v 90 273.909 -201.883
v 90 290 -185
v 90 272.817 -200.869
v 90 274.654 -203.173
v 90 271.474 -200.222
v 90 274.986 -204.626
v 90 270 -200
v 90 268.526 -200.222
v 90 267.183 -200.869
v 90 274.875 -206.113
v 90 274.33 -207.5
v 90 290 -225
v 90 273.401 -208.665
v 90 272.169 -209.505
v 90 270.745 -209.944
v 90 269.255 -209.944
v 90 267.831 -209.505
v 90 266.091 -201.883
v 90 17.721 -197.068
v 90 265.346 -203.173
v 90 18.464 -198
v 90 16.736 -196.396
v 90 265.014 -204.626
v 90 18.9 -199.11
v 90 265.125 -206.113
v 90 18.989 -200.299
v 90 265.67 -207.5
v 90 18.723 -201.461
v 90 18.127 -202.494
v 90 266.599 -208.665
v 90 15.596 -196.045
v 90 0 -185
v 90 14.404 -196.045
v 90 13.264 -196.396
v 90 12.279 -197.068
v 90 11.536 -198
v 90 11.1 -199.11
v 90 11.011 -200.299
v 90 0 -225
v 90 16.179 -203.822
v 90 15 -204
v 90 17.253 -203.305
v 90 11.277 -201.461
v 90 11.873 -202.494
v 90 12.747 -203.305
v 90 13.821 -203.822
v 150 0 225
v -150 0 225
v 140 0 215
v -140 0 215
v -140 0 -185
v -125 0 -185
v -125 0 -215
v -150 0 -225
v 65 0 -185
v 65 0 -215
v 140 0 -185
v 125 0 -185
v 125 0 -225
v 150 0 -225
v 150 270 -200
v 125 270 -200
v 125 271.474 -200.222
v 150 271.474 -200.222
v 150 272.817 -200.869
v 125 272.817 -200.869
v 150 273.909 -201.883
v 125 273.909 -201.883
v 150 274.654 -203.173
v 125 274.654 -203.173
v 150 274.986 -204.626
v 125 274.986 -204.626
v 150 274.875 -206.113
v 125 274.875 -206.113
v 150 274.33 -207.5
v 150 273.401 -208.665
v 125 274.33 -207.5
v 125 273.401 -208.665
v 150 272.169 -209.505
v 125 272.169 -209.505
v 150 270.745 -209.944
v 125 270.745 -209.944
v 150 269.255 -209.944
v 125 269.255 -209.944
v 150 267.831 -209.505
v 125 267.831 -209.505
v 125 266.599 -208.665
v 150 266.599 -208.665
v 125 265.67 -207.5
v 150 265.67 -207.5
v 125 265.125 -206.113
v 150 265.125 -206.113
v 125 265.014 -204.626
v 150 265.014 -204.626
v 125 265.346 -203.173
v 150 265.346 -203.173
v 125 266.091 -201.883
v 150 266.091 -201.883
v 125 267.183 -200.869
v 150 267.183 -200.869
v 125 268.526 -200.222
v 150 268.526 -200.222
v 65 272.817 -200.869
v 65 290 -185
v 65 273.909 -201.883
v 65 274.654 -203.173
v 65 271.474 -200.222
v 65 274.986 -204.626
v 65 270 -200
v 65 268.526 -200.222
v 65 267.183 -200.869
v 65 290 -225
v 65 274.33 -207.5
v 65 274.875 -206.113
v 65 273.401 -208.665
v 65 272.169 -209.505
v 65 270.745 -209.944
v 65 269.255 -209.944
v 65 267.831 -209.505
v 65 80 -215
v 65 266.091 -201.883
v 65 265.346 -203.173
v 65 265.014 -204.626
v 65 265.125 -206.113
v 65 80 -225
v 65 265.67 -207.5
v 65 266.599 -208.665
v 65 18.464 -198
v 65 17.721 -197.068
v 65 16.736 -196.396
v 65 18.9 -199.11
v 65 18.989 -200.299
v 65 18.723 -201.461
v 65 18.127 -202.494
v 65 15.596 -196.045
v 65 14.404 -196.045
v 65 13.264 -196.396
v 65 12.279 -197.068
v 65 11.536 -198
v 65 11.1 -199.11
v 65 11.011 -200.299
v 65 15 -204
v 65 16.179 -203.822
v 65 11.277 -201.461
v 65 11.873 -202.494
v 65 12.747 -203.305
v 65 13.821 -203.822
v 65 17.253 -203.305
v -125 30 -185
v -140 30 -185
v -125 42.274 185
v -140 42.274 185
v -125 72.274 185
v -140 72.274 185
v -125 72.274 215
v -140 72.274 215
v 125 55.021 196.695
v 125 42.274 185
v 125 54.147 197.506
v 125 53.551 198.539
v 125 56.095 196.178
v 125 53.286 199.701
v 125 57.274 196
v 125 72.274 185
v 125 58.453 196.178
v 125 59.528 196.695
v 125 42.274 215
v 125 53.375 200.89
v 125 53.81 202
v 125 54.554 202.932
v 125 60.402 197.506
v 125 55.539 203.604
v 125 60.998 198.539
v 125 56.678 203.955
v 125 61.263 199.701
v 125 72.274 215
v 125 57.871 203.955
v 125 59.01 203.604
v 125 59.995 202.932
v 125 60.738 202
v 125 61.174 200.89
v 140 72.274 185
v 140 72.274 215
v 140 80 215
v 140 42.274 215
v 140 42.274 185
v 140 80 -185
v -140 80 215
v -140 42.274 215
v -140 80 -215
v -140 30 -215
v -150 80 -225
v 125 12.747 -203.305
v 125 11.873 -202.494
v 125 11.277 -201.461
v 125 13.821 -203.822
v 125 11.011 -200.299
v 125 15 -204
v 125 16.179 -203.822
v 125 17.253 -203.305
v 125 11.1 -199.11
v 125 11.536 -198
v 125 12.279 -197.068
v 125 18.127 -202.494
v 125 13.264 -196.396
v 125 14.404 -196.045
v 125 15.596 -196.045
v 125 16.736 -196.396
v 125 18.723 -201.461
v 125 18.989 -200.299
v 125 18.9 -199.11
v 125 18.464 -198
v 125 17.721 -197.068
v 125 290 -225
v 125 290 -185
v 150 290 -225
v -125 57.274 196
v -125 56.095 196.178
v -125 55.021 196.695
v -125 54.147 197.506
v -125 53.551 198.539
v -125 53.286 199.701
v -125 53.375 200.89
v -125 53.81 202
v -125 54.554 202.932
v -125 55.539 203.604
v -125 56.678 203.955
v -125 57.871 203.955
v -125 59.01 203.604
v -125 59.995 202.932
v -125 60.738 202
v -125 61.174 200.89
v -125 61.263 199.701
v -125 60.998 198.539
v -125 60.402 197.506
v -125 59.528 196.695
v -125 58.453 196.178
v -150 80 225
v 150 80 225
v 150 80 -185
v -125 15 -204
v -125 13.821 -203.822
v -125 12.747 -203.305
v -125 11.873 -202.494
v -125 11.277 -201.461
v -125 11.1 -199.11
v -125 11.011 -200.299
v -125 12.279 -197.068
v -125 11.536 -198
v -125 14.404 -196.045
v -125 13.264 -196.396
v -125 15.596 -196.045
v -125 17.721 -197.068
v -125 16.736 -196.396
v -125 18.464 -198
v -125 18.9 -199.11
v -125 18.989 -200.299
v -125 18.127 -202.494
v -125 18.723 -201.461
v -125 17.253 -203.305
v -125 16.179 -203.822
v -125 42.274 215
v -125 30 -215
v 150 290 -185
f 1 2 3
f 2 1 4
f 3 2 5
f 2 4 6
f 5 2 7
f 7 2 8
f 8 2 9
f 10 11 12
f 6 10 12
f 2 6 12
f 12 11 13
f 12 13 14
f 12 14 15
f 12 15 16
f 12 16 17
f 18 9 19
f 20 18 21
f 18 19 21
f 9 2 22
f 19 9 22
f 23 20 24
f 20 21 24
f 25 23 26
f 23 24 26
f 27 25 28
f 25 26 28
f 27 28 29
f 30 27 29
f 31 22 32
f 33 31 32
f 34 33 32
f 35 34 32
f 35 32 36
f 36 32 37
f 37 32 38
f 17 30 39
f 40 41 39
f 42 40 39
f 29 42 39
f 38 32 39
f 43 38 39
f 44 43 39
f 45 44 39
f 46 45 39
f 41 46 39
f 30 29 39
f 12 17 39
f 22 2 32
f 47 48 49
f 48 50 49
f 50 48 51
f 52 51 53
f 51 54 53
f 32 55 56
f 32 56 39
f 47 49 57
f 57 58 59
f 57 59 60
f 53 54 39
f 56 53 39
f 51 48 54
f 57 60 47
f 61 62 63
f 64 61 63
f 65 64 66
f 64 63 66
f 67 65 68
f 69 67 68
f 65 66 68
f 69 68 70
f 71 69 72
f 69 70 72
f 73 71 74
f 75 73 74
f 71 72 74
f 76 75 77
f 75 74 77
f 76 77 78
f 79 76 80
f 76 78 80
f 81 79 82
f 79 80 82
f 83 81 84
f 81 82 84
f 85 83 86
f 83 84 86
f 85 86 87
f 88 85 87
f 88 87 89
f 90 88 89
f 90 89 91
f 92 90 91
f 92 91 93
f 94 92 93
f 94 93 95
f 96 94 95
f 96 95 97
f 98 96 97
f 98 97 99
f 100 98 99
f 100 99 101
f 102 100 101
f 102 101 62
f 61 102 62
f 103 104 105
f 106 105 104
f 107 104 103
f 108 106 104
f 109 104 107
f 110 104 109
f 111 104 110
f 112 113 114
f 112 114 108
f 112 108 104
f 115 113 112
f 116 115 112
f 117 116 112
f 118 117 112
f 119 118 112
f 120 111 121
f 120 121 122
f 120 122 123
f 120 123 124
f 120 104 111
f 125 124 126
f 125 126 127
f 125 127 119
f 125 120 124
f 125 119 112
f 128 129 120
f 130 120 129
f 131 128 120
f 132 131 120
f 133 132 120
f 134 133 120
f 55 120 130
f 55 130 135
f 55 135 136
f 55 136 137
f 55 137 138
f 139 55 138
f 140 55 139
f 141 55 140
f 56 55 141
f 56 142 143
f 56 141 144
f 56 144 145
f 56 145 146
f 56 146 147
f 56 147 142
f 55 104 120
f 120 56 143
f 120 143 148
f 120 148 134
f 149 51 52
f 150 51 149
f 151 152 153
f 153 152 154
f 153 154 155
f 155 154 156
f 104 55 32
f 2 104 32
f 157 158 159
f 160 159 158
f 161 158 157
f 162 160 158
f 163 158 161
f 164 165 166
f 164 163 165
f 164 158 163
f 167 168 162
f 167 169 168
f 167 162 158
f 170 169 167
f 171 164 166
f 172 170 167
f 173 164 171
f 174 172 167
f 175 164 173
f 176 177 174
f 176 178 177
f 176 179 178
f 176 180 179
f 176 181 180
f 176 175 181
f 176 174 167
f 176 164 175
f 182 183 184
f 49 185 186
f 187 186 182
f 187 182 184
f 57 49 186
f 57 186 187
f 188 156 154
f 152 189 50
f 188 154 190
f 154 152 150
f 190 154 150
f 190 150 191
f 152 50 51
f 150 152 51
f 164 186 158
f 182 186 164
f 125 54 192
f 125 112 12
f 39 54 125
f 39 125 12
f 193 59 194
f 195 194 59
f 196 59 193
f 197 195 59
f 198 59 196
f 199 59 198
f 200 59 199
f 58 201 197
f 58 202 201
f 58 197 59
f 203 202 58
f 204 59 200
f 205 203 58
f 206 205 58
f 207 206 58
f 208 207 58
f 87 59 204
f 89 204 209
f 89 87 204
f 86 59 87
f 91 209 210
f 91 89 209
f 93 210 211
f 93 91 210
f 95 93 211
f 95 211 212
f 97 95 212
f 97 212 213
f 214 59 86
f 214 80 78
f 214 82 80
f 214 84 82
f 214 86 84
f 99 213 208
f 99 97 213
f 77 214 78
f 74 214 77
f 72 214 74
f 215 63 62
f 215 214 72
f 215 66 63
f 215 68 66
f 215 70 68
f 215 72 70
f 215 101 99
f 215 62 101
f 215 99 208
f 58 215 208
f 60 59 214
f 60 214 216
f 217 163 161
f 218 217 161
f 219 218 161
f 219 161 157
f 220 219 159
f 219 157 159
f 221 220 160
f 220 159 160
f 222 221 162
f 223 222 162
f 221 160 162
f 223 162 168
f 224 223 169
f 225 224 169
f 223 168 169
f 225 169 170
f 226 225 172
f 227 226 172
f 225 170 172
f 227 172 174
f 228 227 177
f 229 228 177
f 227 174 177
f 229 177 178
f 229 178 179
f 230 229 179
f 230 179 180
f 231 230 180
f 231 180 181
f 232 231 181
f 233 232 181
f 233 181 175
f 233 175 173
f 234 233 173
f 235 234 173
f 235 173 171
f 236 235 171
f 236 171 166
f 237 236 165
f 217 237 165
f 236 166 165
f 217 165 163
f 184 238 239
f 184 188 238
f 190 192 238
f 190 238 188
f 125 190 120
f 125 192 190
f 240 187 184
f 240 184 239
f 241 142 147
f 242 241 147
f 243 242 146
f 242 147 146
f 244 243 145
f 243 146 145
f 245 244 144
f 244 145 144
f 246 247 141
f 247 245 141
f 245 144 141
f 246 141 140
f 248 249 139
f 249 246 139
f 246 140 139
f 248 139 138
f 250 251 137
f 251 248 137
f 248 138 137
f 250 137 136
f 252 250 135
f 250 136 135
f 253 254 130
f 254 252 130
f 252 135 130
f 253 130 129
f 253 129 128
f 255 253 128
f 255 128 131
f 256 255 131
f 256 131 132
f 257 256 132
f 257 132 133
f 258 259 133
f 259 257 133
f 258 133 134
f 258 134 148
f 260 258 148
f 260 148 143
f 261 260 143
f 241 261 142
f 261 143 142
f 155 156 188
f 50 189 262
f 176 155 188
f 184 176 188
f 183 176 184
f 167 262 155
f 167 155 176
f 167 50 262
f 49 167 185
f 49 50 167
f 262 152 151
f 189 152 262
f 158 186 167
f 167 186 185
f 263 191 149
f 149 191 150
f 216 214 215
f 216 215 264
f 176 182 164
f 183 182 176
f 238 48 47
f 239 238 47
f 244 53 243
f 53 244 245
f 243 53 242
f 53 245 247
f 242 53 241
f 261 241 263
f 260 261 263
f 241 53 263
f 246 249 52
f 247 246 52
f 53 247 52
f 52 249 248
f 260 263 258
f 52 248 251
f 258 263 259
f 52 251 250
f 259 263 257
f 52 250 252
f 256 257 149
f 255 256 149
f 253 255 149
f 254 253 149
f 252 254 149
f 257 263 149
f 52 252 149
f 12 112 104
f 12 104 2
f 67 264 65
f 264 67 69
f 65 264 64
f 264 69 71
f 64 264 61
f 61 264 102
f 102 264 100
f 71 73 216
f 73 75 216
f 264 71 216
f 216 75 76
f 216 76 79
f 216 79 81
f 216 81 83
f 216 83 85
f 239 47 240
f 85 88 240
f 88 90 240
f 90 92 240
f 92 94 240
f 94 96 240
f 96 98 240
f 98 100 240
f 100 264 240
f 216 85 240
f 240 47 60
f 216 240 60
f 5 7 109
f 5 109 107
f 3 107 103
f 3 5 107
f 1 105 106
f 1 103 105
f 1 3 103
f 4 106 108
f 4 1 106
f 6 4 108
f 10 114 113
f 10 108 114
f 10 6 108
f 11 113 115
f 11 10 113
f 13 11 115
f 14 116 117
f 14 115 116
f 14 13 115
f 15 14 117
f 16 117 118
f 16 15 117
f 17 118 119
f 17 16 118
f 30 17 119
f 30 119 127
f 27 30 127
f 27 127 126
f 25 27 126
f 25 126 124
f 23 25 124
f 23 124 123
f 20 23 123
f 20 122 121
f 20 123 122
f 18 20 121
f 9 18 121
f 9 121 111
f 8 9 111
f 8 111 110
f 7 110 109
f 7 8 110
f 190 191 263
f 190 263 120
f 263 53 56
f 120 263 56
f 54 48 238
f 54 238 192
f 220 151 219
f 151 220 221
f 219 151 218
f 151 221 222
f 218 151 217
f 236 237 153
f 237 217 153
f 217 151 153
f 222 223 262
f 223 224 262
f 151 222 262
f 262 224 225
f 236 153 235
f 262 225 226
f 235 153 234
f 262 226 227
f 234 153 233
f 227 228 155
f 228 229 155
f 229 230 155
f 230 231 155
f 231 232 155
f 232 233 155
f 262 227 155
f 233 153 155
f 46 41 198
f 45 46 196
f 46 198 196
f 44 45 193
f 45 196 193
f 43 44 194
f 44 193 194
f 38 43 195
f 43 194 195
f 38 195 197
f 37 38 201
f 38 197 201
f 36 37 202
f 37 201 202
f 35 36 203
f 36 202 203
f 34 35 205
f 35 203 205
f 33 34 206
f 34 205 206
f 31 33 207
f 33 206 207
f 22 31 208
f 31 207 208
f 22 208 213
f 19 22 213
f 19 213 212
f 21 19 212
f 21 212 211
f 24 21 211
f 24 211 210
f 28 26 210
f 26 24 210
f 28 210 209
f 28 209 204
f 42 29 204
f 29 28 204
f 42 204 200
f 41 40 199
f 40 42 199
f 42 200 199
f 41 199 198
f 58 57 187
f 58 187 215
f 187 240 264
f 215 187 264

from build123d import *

# Parameters (mm, degrees)
SKETCH1_W                      = 300
SKETCH1_H                      = 450
BOSS_EXTRUDE1_DEPTH            = 80
SHELL1_T                       = -10
SKETCH2_W                      = 30
SKETCH2_H                      = 30
BOSS_EXTRUDE2_DEPTH            = 15
BOSS_EXTRUDE4_REACH            = 366.211
SKETCH3_R                      = 4
SKETCH4_R                      = 4
BOSS_EXTRUDE5_DEPTH            = 250
BOSS_EXTRUDE6_DEPTH            = 210
BOSS_EXTRUDE6_DEPTH_BACK       = 80
SKETCH5_W                      = 25
SKETCH5_H                      = 40
SKETCH6_W                      = 35
SKETCH6_H                      = 80
CUT_EXTRUDE1_DEPTH             = 300
BOSS_EXTRUDE7_START            = -80
SKETCH8_W                      = 25
SKETCH8_H                      = 40
BOSS_EXTRUDE7_DEPTH            = 290
CUT_EXTRUDE2_REACH             = 460.639
SKETCH10_R                     = 5
CUT_EXTRUDE2_DIRECTION_2_DEPTH = 300


with BuildPart() as part:
    # Sketch1 → Boss-Extrude1 (new body)
    with BuildSketch(Plane(origin=(0, 0, 0), x_dir=(1, 0, 0), z_dir=(0, 1, 0))):
        Rectangle(SKETCH1_W, SKETCH1_H)
    extrude(amount=BOSS_EXTRUDE1_DEPTH)

    # Shell1
    shell1_openings = [part.faces().sort_by_distance(p)[0] for p in [
        (0, 80, 0),
        (0, 0, 0),
    ]]
    offset(amount=SHELL1_T, openings=shell1_openings, kind=Kind.INTERSECTION)

    # Sketch2 → Boss-Extrude2 (add)
    with BuildSketch(Plane.ZY.offset(-140)):
        with Locations((-200, 15)):
            Rectangle(SKETCH2_W, SKETCH2_H)
        with Locations((200, 57.274341307)):
            Rectangle(SKETCH2_W, SKETCH2_H)
    boss_extrude2 = extrude(amount=BOSS_EXTRUDE2_DEPTH)

    # Mirror2: Boss-Extrude2 across plane
    add(boss_extrude2.mirror(Plane(origin=(0, 0, 0), x_dir=(0, 0, 1), z_dir=(1, 0, 0))))

    # Sketch3 → Boss-Extrude4 (add, up to next)
    with BuildSketch(Plane.ZY.offset(-125), mode=Mode.PRIVATE) as boss_extrude4_sk1:
        with Locations(Location((-200, 15, 0), (0, 0, 180))):
            Circle(SKETCH3_R)
    boss_extrude4_tool1 = extrude(boss_extrude4_sk1.sketch, amount=BOSS_EXTRUDE4_REACH, mode=Mode.PRIVATE) - part.part
    add(boss_extrude4_tool1.solids().sort_by_distance((125, 15, -200))[0])

    # Sketch4 → Boss-Extrude5 (add)
    with BuildSketch(Plane.ZY.offset(-125)):
        with Locations(Location((200, 57.274341307, 0), (0, 0, 180))):
            Circle(SKETCH4_R)
    extrude(amount=BOSS_EXTRUDE5_DEPTH)

    # Sketch5 → Boss-Extrude6 (add, two sides: drawn at the far end of the back side and taken through both)
    with BuildSketch(Plane(origin=(0, 80, 0), x_dir=(1, 0, 0), z_dir=(0, 1, 0)).offset(-BOSS_EXTRUDE6_DEPTH_BACK)):
        with Locations((137.5, 205)):
            Rectangle(SKETCH5_W, SKETCH5_H)
    extrude(amount=BOSS_EXTRUDE6_DEPTH + BOSS_EXTRUDE6_DEPTH_BACK)

    # Sketch6 → Cut-Extrude1 (cut)
    with BuildSketch(Plane.XY.offset(-215)):
        with Locations((107.5, 40)):
            Rectangle(SKETCH6_W, SKETCH6_H)
    extrude(amount=-CUT_EXTRUDE1_DEPTH, mode=Mode.SUBTRACT)

    # Sketch8 → Boss-Extrude7 (add)
    with BuildSketch(Plane(origin=(0, 80, 0), x_dir=(1, 0, 0), z_dir=(0, 1, 0)).offset(BOSS_EXTRUDE7_START)):
        with Locations((77.5, 205)):
            Rectangle(SKETCH8_W, SKETCH8_H)
    extrude(amount=BOSS_EXTRUDE7_DEPTH)

    # Cut-Extrude2: up to this face of the body (flat: up to its plane)
    cut_extrude2_end = Plane(part.part.faces().sort_by_distance((65, 153.422023127, -203.907073233))[0])
    # Sketch10 → Cut-Extrude2 (cut, up to the picked face)
    with BuildSketch(Plane.ZY.offset(-125), mode=Mode.PRIVATE) as cut_extrude2_sk1:
        with Locations((-205, 270)):
            Circle(SKETCH10_R)
    cut_extrude2_tool1 = split(extrude(cut_extrude2_sk1.sketch, amount=CUT_EXTRUDE2_REACH, mode=Mode.PRIVATE), bisect_by=cut_extrude2_end, keep=Keep.BOTH, mode=Mode.PRIVATE)
    add(cut_extrude2_tool1.solids().sort_by(Axis((125, 270, -205), (-1, 0, 0)))[0], mode=Mode.SUBTRACT)

    # Sketch10 → Cut-Extrude2 direction 2 (cut)
    with BuildSketch(Plane.ZY.offset(-125)):
        with Locations((-205, 270)):
            Circle(SKETCH10_R)
    extrude(amount=-CUT_EXTRUDE2_DIRECTION_2_DEPTH, mode=Mode.SUBTRACT)


solid = part.part
